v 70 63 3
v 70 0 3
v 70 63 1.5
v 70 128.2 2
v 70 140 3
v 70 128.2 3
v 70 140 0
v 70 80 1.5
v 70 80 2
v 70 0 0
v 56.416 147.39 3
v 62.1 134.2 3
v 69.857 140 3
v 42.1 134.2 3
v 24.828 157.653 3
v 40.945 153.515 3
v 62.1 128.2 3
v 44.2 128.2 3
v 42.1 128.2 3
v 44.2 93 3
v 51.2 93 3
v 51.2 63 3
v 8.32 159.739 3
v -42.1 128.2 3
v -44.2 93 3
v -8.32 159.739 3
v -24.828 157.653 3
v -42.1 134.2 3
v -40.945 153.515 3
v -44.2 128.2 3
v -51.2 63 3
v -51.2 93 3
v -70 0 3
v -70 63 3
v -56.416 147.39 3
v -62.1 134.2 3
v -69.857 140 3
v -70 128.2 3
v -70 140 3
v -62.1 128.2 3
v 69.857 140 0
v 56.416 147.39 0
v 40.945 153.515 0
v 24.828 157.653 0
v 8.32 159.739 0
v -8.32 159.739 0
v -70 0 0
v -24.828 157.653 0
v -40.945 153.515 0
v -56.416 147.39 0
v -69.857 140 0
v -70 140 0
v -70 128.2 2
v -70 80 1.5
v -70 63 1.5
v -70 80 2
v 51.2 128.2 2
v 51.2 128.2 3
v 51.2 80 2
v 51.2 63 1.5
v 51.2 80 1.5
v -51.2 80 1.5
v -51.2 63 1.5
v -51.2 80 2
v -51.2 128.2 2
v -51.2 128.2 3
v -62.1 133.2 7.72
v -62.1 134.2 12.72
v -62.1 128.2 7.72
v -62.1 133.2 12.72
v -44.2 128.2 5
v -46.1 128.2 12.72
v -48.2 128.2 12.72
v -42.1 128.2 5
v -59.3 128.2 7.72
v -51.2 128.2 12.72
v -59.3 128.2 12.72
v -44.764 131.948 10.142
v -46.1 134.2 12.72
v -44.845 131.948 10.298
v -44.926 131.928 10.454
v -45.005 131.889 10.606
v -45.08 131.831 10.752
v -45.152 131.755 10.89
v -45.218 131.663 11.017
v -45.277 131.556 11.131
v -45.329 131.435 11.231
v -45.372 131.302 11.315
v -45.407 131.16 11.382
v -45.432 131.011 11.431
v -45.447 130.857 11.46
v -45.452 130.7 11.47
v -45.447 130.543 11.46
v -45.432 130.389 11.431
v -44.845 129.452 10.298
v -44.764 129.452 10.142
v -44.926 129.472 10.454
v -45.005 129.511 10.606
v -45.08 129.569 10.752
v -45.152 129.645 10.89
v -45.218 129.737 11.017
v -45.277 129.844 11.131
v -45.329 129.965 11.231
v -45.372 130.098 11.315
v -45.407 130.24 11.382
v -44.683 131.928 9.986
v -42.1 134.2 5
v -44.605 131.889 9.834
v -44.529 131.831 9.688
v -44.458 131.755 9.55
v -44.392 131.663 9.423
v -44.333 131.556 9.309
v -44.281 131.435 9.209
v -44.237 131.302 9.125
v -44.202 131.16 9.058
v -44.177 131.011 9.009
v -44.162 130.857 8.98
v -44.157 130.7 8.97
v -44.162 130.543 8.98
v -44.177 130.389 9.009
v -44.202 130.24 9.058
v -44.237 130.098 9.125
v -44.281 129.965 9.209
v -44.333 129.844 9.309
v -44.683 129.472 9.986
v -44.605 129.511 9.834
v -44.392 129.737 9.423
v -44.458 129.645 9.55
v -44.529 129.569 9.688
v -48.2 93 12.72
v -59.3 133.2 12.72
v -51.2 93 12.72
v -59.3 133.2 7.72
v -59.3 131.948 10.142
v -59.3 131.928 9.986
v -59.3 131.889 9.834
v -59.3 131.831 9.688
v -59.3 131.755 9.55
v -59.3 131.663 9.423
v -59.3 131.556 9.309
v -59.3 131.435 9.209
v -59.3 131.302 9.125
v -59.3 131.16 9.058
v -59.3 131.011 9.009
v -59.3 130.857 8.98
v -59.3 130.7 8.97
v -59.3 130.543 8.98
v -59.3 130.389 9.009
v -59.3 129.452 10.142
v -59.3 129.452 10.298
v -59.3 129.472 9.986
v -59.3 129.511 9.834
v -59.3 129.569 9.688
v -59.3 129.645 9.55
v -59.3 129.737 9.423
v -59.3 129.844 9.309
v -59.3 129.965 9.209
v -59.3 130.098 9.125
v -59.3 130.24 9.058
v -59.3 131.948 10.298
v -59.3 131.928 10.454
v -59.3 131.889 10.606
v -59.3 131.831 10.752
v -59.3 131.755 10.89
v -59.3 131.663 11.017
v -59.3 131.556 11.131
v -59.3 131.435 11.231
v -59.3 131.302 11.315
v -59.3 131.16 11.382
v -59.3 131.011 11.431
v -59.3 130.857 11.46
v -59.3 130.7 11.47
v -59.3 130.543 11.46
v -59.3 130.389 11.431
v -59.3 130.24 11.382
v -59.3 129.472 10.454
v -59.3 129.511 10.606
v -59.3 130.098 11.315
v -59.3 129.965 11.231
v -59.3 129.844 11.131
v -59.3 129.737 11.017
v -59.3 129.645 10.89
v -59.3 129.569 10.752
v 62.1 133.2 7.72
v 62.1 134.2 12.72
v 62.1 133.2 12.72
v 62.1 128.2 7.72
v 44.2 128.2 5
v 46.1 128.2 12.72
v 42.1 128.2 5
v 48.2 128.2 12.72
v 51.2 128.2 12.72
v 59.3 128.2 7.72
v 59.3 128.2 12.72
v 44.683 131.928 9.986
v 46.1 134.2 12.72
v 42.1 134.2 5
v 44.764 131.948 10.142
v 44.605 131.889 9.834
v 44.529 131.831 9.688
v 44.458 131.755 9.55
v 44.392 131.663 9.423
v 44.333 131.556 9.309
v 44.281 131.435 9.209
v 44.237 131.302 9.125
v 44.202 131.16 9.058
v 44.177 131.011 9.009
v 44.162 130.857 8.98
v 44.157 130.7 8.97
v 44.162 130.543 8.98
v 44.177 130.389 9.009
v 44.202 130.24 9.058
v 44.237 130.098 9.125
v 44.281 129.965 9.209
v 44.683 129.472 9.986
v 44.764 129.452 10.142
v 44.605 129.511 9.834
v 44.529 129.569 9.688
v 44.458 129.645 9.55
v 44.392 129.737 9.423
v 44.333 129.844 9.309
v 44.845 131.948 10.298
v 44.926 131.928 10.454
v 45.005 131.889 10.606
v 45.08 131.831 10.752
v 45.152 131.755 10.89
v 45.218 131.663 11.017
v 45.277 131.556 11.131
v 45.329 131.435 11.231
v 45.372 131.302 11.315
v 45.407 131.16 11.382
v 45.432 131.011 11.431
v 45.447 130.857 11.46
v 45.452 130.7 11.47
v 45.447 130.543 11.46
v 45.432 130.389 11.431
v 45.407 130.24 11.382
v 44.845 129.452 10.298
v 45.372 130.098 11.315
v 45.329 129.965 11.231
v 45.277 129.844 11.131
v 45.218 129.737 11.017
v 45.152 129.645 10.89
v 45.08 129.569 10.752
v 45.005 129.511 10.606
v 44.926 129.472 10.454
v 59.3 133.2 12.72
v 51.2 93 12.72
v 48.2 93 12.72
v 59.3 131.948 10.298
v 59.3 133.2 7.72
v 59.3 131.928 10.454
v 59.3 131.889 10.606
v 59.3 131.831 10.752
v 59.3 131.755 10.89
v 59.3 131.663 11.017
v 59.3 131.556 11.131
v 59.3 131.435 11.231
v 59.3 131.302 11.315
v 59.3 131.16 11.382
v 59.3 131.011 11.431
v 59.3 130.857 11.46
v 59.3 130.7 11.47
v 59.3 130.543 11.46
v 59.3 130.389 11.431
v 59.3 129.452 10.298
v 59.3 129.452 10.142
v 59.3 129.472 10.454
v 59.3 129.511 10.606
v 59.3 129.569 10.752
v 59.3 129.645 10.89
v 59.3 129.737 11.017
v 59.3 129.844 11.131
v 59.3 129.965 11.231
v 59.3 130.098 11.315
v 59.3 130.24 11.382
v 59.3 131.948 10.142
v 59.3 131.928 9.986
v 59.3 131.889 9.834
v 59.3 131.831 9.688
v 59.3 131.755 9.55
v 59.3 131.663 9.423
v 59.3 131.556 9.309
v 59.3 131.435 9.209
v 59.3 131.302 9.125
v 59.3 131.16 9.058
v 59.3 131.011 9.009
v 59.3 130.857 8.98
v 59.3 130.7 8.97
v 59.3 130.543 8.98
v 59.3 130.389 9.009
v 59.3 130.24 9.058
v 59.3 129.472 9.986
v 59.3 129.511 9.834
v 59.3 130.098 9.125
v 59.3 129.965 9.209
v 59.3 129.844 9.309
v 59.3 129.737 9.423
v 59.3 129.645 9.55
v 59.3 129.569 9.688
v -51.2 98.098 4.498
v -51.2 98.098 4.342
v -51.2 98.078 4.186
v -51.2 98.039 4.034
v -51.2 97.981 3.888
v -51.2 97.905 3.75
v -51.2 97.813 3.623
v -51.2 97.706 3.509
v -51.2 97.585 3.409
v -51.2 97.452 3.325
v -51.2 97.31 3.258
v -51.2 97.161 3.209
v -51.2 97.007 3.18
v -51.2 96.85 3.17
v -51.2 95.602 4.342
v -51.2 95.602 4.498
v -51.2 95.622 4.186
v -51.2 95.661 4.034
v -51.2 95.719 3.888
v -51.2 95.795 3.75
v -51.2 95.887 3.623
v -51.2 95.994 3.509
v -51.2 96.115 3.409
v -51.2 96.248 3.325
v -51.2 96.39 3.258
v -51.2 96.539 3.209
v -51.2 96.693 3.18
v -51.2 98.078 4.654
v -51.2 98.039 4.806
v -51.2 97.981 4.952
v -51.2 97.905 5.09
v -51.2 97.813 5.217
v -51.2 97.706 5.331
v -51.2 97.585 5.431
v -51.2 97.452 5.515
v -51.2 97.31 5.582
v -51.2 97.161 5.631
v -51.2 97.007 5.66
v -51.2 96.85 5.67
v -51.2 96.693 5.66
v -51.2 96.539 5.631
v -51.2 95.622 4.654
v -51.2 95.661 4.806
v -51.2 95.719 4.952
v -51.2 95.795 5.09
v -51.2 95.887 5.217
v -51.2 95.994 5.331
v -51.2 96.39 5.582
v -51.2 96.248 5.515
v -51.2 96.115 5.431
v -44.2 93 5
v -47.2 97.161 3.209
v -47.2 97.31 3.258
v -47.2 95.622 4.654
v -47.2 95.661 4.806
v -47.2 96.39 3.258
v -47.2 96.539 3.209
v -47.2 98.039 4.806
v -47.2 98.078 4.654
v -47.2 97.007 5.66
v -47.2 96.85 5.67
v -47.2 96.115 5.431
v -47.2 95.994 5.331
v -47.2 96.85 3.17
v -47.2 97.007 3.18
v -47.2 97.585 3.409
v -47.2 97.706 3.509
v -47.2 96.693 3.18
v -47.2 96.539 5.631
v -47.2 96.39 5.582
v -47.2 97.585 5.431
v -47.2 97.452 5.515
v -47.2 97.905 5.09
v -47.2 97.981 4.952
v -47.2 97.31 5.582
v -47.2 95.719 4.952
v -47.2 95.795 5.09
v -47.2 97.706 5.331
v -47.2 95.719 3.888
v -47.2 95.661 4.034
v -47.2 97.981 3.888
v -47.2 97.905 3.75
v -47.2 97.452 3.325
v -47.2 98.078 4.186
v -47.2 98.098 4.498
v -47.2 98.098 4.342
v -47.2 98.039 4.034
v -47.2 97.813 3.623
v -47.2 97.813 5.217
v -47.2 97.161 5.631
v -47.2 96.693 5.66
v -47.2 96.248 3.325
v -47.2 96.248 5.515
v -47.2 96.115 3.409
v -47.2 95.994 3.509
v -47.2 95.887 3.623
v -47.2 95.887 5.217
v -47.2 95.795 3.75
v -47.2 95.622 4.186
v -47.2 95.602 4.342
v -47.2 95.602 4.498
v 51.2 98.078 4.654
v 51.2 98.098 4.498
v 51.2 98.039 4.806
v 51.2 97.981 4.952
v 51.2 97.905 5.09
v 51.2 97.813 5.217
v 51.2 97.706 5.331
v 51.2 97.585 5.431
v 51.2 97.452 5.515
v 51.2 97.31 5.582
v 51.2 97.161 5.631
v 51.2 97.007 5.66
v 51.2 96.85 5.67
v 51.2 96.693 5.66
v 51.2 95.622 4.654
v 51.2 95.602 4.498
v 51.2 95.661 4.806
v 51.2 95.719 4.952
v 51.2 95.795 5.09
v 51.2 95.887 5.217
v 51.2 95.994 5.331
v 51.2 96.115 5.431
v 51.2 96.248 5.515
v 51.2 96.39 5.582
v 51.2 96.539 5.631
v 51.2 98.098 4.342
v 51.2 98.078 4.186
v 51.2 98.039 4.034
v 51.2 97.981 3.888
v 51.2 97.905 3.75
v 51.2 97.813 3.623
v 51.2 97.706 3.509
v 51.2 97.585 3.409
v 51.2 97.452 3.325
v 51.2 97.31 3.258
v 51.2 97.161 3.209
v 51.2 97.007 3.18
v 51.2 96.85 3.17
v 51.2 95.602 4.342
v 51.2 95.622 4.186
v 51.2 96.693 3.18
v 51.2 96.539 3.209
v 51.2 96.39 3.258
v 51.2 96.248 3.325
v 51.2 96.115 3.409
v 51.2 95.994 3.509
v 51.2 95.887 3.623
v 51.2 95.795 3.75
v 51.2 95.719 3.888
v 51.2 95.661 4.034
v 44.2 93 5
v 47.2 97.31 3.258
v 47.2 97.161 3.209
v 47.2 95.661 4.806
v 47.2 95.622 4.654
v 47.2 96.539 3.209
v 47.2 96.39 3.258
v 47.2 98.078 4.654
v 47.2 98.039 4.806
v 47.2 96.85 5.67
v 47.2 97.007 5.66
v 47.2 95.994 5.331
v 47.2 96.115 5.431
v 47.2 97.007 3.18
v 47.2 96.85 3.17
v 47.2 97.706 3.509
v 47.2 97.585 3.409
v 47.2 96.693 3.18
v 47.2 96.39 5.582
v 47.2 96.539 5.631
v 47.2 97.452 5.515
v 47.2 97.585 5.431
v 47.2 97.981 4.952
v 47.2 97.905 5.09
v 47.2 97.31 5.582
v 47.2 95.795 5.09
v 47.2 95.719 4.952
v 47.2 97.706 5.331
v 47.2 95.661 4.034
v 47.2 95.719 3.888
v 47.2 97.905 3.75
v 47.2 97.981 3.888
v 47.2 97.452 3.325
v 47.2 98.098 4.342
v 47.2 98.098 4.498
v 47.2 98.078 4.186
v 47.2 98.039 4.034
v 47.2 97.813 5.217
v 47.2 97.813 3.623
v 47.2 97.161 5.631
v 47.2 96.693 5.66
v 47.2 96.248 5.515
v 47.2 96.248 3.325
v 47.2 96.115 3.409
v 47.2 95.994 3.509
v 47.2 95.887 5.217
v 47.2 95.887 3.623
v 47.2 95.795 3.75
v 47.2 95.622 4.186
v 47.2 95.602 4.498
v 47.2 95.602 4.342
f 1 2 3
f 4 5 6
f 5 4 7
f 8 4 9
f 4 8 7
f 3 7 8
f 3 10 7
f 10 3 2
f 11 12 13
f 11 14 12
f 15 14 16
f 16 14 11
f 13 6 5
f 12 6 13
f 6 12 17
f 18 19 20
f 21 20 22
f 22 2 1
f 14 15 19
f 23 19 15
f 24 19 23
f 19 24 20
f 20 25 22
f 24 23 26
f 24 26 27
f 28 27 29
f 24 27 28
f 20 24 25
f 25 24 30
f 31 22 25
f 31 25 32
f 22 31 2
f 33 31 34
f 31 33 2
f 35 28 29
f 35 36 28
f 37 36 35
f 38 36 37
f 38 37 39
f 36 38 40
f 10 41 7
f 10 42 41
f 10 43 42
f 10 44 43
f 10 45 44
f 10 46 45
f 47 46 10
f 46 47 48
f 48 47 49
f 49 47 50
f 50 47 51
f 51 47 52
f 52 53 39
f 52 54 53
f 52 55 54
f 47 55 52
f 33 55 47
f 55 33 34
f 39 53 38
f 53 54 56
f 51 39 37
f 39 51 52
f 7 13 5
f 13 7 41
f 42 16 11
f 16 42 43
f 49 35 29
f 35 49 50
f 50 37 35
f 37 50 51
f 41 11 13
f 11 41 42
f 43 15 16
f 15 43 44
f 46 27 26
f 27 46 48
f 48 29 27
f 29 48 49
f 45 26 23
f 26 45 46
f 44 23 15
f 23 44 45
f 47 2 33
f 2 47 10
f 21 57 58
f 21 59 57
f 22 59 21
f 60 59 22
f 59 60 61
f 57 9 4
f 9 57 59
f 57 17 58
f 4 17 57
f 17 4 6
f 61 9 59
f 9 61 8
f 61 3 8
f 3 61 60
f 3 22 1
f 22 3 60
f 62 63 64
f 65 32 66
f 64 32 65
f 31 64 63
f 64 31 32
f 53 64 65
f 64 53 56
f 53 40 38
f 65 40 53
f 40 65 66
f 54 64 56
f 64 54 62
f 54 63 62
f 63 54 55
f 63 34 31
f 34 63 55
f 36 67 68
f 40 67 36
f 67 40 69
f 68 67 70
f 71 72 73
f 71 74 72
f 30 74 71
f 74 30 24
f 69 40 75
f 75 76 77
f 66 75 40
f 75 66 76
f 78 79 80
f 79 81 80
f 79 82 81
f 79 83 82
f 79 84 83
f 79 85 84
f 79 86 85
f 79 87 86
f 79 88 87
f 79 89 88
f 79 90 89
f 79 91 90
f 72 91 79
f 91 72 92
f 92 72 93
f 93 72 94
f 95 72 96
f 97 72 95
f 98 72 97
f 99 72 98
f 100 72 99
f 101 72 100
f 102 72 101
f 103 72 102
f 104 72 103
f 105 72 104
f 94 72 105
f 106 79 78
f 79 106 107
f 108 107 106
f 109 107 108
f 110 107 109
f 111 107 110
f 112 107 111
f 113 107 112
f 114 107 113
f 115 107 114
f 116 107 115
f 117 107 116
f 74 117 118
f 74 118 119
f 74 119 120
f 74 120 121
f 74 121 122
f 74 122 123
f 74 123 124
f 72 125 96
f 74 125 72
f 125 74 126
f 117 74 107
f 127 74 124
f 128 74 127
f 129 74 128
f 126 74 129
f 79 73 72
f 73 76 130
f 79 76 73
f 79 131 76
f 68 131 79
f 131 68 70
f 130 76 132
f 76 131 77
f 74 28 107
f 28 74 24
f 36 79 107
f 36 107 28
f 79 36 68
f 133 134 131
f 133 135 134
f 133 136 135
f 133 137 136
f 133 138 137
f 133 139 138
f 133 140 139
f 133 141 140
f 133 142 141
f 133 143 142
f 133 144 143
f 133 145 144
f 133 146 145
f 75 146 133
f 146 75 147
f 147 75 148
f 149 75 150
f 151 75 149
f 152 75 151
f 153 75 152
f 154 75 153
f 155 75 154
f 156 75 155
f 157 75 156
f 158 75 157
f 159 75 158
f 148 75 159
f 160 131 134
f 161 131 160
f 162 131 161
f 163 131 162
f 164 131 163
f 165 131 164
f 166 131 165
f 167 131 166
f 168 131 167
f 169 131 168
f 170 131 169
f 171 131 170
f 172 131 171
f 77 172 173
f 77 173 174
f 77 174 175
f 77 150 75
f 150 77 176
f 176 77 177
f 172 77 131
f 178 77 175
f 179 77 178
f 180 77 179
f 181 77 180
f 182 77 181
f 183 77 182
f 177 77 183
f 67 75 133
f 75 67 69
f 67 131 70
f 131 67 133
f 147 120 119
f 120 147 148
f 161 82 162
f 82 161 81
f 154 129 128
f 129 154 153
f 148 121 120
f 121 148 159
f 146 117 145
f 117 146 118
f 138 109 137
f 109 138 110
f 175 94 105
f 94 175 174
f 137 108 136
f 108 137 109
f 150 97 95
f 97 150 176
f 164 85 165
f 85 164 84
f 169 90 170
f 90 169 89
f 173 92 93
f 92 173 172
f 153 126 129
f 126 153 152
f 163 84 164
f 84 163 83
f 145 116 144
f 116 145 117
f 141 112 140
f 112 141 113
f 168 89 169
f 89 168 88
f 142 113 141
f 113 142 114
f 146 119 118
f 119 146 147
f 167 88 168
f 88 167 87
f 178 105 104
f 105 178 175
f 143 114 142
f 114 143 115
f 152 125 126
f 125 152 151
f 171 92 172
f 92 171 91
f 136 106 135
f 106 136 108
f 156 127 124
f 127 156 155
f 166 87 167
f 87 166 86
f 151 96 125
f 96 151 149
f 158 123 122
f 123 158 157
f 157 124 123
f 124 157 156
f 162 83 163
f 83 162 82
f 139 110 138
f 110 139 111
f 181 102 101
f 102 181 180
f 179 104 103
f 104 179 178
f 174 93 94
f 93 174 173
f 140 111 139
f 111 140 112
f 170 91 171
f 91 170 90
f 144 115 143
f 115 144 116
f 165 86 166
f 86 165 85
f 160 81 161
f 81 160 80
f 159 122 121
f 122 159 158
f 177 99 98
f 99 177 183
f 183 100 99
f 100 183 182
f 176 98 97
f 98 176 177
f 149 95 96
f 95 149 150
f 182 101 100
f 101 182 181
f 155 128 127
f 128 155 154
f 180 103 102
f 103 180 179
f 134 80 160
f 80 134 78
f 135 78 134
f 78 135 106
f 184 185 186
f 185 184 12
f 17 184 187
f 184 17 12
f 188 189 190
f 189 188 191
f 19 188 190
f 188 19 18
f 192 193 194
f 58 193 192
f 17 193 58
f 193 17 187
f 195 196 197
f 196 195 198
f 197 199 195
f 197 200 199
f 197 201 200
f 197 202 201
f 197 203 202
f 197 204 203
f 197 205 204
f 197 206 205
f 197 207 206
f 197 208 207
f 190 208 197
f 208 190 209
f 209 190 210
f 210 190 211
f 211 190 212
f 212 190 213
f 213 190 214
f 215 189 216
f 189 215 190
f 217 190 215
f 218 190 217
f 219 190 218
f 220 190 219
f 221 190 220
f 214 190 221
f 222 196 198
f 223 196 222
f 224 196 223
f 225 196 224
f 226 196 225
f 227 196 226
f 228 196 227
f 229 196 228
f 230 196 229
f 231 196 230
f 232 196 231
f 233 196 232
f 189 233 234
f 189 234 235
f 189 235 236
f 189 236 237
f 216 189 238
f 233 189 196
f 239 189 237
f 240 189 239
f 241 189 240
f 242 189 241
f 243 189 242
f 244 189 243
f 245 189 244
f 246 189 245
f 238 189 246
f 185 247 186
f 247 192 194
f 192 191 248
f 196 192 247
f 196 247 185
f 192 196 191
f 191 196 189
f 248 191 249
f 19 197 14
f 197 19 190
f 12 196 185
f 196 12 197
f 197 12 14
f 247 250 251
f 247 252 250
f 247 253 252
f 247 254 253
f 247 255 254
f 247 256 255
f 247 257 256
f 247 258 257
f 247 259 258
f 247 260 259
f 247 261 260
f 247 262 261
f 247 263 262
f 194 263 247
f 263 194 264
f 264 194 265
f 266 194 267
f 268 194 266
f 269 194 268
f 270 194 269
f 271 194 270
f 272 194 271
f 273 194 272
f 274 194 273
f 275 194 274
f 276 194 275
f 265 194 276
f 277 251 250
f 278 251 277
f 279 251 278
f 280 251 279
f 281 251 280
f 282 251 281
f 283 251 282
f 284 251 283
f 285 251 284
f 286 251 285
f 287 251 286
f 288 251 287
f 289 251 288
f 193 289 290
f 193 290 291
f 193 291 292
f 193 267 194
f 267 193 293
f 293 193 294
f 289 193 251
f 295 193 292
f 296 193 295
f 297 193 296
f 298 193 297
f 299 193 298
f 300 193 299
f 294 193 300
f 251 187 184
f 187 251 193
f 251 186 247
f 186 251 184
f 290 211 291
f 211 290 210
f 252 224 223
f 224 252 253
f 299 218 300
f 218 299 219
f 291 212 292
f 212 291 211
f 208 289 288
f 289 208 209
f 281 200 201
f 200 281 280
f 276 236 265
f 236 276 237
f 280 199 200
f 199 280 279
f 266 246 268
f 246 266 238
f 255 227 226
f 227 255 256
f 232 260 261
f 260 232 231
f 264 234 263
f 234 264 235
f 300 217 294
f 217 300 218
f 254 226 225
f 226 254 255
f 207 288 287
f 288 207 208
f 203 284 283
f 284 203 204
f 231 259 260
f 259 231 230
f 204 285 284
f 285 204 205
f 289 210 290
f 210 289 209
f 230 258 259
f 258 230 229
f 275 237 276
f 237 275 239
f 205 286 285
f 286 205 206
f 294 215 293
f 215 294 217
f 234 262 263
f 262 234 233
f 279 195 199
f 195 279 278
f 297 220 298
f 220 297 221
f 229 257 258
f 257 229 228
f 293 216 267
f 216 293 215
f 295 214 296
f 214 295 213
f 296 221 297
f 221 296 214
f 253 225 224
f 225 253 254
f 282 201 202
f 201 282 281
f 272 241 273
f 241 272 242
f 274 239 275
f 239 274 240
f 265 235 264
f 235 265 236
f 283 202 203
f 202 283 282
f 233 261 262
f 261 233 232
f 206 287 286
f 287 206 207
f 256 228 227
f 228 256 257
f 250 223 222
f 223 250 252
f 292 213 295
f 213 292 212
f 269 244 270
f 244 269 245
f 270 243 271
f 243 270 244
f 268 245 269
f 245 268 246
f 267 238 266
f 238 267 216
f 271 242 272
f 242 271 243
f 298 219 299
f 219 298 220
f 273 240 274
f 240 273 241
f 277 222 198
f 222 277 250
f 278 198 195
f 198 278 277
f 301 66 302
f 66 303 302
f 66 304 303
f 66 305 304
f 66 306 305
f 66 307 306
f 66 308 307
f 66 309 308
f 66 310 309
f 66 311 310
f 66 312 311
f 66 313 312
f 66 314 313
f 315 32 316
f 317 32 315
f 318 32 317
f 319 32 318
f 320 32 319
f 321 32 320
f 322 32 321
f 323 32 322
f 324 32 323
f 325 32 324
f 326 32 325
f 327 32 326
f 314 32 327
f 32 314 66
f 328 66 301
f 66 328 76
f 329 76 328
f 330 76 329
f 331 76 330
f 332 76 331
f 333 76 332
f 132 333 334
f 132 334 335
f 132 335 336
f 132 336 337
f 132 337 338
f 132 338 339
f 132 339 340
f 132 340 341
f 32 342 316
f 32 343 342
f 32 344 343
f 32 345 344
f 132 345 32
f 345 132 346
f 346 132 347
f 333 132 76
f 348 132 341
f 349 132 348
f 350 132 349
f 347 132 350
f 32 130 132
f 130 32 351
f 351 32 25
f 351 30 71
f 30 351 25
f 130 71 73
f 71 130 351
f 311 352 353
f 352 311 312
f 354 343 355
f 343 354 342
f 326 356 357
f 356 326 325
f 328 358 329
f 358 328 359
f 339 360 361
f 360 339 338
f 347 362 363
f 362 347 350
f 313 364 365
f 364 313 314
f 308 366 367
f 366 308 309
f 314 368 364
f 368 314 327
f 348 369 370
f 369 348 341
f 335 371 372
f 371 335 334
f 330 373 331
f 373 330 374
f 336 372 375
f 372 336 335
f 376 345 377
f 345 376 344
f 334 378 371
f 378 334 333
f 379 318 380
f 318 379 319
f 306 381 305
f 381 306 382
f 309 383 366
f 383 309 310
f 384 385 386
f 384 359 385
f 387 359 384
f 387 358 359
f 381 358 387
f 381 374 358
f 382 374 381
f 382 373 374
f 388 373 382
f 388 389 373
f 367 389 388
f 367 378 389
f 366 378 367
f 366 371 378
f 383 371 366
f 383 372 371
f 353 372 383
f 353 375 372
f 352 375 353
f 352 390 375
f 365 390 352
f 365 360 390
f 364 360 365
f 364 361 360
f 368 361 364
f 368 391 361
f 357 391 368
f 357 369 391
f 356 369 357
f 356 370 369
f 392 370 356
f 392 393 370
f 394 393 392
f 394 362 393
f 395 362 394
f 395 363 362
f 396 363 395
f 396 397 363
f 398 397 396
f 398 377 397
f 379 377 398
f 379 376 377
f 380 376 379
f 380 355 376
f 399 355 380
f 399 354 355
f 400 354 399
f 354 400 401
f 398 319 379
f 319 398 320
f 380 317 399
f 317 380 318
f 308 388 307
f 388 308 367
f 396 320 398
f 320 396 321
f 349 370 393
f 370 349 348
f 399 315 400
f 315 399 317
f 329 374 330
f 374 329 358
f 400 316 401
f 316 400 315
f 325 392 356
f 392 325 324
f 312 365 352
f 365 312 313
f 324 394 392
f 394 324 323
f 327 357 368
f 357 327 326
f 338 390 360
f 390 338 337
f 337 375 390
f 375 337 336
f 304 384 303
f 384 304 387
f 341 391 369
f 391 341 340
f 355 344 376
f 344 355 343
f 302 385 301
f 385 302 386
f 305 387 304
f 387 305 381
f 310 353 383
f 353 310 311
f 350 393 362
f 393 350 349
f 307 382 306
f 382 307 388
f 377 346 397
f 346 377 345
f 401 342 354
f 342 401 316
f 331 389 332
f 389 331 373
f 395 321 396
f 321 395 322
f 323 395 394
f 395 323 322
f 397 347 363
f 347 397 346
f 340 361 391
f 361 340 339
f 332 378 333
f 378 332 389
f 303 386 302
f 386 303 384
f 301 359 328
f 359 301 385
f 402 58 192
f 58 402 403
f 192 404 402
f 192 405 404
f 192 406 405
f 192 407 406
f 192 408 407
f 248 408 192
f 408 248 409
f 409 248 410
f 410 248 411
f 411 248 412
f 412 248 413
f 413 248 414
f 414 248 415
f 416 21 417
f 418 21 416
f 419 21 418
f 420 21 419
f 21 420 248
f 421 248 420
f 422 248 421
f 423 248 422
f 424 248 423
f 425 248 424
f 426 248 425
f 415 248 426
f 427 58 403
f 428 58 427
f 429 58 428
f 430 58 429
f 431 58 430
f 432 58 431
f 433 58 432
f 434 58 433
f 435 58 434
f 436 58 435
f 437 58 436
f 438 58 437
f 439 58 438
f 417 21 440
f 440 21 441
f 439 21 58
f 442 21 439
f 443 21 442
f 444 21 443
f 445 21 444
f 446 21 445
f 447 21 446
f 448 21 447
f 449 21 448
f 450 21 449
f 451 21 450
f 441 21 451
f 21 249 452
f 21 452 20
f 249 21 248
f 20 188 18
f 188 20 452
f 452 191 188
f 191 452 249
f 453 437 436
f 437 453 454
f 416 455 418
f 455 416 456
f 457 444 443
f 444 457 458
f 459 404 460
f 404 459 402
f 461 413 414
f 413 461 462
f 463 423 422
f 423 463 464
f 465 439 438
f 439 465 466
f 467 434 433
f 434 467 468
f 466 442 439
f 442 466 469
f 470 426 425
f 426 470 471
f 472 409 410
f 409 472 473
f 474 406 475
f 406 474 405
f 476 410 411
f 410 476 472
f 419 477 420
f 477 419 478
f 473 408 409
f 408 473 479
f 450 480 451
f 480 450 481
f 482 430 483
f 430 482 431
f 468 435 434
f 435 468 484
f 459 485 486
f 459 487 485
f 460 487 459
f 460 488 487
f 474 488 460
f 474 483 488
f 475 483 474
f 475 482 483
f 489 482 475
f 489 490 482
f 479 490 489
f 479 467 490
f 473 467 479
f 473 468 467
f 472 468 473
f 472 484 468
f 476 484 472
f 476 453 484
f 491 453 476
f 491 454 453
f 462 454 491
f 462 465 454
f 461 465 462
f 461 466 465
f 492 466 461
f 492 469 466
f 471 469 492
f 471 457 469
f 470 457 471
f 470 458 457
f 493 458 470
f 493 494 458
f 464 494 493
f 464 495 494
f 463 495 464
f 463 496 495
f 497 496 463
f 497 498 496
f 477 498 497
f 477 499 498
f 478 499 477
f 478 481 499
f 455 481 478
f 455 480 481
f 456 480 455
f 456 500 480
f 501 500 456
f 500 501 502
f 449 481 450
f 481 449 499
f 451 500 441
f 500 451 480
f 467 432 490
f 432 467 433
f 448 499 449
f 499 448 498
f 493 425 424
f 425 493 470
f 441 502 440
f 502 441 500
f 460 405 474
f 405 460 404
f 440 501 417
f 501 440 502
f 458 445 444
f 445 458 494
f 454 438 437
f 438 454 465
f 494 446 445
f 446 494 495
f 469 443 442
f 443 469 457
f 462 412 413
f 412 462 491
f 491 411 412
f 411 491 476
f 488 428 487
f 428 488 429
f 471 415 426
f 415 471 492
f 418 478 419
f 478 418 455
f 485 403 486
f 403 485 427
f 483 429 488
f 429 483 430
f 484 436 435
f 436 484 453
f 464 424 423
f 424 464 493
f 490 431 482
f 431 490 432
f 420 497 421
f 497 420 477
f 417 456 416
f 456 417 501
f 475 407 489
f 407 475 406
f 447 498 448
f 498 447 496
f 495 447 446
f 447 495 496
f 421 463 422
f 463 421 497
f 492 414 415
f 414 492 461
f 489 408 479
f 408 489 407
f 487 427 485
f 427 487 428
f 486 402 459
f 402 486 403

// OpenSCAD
$fn = 50;

module step1()
{
    union()
    {
        translate([-70, 0, 0])
            cube([140, 140, 3]);
        translate([0, 27.5, 0])
            cylinder(3, 132.5, 132.5);
    }
}

module step2()
{
    difference()
    {
        step1();
        mirror([1, 0, 0])
        translate([-132.5, -100, 0])
            cube([62.5, 300, 3]);
        translate([-132.5, -100, 0])
            cube([62.5, 300, 3]);
        translate([-132.5, -120, 0])
            cube([265, 120, 3]);
    }
}

module step3()
{
    difference()
    {
        step2();
        mirror([1, 0, 0])
        {
            // Gearbox
            translate([-70, 80, 2])
                cube([18.8, 48.2, 1.5]);
            // Motor
            translate([-70, 63, 1.5])
                cube([18.8, 17, 2]);
        }
        {
            // Gearbox
            translate([-70, 80, 2])
                cube([18.8, 48.2, 1.5]);
            // Motor
            translate([-70, 63, 1.5])
                cube([18.8, 17, 2]);
        }
    }
}

module step4()
{
    union()
    {
        step3();
        mirror([1, 0, 0])
        difference()
        {
            translate([-62.1, 128.2, 3])
            {
                hull()
                {
                    cube([20, 6, 2]);
                    translate([0, 0, 7.72])
                        cube([16, 6, 2]);
                }
            }
            translate([-62.1, 128.2, 7.72])
                cube([2.8, 5, 5]);
            translate([-62.1, 130.7, 10.22])
                rotate([0, 90, 0])
                    cylinder(20, 1.25, 1.25);
        }
        difference()
        {
            translate([-62.1, 128.2, 3])
            {
                hull()
                {
                    cube([20, 6, 2]);
                    translate([0, 0, 7.72])
                        cube([16, 6, 2]);
                }
            }
            translate([-62.1, 128.2, 7.72])
                cube([2.8, 5, 5]);
            translate([-62.1, 130.7, 10.22])
                rotate([0, 90, 0])
                    cylinder(20, 1.25, 1.25);
        }
        mirror([1, 0, 0])
        difference()
        {
            translate([-51.2, 93, 3])
            {
                hull()
                {
                    cube([7, 35.2, 2]);
                    translate([0, 0, 7.72])
                    {
                        cube([3, 35.2, 2]);
                    }
                }
            }
            translate([-51.2, 96.85, 4.42])
                rotate([0, 90, 0])
                    cylinder(4, 1.25, 1.25);
        }
        difference()
        {
            translate([-51.2, 93, 3])
            {
                hull()
                {
                    cube([7, 35.2, 2]);
                    translate([0, 0, 7.72])
                    {
                        cube([3, 35.2, 2]);
                    }
                }
            }
            translate([-51.2, 96.85, 4.42])
                rotate([0, 90, 0])
                    cylinder(4, 1.25, 1.25);
        }
    }
}

step4();
